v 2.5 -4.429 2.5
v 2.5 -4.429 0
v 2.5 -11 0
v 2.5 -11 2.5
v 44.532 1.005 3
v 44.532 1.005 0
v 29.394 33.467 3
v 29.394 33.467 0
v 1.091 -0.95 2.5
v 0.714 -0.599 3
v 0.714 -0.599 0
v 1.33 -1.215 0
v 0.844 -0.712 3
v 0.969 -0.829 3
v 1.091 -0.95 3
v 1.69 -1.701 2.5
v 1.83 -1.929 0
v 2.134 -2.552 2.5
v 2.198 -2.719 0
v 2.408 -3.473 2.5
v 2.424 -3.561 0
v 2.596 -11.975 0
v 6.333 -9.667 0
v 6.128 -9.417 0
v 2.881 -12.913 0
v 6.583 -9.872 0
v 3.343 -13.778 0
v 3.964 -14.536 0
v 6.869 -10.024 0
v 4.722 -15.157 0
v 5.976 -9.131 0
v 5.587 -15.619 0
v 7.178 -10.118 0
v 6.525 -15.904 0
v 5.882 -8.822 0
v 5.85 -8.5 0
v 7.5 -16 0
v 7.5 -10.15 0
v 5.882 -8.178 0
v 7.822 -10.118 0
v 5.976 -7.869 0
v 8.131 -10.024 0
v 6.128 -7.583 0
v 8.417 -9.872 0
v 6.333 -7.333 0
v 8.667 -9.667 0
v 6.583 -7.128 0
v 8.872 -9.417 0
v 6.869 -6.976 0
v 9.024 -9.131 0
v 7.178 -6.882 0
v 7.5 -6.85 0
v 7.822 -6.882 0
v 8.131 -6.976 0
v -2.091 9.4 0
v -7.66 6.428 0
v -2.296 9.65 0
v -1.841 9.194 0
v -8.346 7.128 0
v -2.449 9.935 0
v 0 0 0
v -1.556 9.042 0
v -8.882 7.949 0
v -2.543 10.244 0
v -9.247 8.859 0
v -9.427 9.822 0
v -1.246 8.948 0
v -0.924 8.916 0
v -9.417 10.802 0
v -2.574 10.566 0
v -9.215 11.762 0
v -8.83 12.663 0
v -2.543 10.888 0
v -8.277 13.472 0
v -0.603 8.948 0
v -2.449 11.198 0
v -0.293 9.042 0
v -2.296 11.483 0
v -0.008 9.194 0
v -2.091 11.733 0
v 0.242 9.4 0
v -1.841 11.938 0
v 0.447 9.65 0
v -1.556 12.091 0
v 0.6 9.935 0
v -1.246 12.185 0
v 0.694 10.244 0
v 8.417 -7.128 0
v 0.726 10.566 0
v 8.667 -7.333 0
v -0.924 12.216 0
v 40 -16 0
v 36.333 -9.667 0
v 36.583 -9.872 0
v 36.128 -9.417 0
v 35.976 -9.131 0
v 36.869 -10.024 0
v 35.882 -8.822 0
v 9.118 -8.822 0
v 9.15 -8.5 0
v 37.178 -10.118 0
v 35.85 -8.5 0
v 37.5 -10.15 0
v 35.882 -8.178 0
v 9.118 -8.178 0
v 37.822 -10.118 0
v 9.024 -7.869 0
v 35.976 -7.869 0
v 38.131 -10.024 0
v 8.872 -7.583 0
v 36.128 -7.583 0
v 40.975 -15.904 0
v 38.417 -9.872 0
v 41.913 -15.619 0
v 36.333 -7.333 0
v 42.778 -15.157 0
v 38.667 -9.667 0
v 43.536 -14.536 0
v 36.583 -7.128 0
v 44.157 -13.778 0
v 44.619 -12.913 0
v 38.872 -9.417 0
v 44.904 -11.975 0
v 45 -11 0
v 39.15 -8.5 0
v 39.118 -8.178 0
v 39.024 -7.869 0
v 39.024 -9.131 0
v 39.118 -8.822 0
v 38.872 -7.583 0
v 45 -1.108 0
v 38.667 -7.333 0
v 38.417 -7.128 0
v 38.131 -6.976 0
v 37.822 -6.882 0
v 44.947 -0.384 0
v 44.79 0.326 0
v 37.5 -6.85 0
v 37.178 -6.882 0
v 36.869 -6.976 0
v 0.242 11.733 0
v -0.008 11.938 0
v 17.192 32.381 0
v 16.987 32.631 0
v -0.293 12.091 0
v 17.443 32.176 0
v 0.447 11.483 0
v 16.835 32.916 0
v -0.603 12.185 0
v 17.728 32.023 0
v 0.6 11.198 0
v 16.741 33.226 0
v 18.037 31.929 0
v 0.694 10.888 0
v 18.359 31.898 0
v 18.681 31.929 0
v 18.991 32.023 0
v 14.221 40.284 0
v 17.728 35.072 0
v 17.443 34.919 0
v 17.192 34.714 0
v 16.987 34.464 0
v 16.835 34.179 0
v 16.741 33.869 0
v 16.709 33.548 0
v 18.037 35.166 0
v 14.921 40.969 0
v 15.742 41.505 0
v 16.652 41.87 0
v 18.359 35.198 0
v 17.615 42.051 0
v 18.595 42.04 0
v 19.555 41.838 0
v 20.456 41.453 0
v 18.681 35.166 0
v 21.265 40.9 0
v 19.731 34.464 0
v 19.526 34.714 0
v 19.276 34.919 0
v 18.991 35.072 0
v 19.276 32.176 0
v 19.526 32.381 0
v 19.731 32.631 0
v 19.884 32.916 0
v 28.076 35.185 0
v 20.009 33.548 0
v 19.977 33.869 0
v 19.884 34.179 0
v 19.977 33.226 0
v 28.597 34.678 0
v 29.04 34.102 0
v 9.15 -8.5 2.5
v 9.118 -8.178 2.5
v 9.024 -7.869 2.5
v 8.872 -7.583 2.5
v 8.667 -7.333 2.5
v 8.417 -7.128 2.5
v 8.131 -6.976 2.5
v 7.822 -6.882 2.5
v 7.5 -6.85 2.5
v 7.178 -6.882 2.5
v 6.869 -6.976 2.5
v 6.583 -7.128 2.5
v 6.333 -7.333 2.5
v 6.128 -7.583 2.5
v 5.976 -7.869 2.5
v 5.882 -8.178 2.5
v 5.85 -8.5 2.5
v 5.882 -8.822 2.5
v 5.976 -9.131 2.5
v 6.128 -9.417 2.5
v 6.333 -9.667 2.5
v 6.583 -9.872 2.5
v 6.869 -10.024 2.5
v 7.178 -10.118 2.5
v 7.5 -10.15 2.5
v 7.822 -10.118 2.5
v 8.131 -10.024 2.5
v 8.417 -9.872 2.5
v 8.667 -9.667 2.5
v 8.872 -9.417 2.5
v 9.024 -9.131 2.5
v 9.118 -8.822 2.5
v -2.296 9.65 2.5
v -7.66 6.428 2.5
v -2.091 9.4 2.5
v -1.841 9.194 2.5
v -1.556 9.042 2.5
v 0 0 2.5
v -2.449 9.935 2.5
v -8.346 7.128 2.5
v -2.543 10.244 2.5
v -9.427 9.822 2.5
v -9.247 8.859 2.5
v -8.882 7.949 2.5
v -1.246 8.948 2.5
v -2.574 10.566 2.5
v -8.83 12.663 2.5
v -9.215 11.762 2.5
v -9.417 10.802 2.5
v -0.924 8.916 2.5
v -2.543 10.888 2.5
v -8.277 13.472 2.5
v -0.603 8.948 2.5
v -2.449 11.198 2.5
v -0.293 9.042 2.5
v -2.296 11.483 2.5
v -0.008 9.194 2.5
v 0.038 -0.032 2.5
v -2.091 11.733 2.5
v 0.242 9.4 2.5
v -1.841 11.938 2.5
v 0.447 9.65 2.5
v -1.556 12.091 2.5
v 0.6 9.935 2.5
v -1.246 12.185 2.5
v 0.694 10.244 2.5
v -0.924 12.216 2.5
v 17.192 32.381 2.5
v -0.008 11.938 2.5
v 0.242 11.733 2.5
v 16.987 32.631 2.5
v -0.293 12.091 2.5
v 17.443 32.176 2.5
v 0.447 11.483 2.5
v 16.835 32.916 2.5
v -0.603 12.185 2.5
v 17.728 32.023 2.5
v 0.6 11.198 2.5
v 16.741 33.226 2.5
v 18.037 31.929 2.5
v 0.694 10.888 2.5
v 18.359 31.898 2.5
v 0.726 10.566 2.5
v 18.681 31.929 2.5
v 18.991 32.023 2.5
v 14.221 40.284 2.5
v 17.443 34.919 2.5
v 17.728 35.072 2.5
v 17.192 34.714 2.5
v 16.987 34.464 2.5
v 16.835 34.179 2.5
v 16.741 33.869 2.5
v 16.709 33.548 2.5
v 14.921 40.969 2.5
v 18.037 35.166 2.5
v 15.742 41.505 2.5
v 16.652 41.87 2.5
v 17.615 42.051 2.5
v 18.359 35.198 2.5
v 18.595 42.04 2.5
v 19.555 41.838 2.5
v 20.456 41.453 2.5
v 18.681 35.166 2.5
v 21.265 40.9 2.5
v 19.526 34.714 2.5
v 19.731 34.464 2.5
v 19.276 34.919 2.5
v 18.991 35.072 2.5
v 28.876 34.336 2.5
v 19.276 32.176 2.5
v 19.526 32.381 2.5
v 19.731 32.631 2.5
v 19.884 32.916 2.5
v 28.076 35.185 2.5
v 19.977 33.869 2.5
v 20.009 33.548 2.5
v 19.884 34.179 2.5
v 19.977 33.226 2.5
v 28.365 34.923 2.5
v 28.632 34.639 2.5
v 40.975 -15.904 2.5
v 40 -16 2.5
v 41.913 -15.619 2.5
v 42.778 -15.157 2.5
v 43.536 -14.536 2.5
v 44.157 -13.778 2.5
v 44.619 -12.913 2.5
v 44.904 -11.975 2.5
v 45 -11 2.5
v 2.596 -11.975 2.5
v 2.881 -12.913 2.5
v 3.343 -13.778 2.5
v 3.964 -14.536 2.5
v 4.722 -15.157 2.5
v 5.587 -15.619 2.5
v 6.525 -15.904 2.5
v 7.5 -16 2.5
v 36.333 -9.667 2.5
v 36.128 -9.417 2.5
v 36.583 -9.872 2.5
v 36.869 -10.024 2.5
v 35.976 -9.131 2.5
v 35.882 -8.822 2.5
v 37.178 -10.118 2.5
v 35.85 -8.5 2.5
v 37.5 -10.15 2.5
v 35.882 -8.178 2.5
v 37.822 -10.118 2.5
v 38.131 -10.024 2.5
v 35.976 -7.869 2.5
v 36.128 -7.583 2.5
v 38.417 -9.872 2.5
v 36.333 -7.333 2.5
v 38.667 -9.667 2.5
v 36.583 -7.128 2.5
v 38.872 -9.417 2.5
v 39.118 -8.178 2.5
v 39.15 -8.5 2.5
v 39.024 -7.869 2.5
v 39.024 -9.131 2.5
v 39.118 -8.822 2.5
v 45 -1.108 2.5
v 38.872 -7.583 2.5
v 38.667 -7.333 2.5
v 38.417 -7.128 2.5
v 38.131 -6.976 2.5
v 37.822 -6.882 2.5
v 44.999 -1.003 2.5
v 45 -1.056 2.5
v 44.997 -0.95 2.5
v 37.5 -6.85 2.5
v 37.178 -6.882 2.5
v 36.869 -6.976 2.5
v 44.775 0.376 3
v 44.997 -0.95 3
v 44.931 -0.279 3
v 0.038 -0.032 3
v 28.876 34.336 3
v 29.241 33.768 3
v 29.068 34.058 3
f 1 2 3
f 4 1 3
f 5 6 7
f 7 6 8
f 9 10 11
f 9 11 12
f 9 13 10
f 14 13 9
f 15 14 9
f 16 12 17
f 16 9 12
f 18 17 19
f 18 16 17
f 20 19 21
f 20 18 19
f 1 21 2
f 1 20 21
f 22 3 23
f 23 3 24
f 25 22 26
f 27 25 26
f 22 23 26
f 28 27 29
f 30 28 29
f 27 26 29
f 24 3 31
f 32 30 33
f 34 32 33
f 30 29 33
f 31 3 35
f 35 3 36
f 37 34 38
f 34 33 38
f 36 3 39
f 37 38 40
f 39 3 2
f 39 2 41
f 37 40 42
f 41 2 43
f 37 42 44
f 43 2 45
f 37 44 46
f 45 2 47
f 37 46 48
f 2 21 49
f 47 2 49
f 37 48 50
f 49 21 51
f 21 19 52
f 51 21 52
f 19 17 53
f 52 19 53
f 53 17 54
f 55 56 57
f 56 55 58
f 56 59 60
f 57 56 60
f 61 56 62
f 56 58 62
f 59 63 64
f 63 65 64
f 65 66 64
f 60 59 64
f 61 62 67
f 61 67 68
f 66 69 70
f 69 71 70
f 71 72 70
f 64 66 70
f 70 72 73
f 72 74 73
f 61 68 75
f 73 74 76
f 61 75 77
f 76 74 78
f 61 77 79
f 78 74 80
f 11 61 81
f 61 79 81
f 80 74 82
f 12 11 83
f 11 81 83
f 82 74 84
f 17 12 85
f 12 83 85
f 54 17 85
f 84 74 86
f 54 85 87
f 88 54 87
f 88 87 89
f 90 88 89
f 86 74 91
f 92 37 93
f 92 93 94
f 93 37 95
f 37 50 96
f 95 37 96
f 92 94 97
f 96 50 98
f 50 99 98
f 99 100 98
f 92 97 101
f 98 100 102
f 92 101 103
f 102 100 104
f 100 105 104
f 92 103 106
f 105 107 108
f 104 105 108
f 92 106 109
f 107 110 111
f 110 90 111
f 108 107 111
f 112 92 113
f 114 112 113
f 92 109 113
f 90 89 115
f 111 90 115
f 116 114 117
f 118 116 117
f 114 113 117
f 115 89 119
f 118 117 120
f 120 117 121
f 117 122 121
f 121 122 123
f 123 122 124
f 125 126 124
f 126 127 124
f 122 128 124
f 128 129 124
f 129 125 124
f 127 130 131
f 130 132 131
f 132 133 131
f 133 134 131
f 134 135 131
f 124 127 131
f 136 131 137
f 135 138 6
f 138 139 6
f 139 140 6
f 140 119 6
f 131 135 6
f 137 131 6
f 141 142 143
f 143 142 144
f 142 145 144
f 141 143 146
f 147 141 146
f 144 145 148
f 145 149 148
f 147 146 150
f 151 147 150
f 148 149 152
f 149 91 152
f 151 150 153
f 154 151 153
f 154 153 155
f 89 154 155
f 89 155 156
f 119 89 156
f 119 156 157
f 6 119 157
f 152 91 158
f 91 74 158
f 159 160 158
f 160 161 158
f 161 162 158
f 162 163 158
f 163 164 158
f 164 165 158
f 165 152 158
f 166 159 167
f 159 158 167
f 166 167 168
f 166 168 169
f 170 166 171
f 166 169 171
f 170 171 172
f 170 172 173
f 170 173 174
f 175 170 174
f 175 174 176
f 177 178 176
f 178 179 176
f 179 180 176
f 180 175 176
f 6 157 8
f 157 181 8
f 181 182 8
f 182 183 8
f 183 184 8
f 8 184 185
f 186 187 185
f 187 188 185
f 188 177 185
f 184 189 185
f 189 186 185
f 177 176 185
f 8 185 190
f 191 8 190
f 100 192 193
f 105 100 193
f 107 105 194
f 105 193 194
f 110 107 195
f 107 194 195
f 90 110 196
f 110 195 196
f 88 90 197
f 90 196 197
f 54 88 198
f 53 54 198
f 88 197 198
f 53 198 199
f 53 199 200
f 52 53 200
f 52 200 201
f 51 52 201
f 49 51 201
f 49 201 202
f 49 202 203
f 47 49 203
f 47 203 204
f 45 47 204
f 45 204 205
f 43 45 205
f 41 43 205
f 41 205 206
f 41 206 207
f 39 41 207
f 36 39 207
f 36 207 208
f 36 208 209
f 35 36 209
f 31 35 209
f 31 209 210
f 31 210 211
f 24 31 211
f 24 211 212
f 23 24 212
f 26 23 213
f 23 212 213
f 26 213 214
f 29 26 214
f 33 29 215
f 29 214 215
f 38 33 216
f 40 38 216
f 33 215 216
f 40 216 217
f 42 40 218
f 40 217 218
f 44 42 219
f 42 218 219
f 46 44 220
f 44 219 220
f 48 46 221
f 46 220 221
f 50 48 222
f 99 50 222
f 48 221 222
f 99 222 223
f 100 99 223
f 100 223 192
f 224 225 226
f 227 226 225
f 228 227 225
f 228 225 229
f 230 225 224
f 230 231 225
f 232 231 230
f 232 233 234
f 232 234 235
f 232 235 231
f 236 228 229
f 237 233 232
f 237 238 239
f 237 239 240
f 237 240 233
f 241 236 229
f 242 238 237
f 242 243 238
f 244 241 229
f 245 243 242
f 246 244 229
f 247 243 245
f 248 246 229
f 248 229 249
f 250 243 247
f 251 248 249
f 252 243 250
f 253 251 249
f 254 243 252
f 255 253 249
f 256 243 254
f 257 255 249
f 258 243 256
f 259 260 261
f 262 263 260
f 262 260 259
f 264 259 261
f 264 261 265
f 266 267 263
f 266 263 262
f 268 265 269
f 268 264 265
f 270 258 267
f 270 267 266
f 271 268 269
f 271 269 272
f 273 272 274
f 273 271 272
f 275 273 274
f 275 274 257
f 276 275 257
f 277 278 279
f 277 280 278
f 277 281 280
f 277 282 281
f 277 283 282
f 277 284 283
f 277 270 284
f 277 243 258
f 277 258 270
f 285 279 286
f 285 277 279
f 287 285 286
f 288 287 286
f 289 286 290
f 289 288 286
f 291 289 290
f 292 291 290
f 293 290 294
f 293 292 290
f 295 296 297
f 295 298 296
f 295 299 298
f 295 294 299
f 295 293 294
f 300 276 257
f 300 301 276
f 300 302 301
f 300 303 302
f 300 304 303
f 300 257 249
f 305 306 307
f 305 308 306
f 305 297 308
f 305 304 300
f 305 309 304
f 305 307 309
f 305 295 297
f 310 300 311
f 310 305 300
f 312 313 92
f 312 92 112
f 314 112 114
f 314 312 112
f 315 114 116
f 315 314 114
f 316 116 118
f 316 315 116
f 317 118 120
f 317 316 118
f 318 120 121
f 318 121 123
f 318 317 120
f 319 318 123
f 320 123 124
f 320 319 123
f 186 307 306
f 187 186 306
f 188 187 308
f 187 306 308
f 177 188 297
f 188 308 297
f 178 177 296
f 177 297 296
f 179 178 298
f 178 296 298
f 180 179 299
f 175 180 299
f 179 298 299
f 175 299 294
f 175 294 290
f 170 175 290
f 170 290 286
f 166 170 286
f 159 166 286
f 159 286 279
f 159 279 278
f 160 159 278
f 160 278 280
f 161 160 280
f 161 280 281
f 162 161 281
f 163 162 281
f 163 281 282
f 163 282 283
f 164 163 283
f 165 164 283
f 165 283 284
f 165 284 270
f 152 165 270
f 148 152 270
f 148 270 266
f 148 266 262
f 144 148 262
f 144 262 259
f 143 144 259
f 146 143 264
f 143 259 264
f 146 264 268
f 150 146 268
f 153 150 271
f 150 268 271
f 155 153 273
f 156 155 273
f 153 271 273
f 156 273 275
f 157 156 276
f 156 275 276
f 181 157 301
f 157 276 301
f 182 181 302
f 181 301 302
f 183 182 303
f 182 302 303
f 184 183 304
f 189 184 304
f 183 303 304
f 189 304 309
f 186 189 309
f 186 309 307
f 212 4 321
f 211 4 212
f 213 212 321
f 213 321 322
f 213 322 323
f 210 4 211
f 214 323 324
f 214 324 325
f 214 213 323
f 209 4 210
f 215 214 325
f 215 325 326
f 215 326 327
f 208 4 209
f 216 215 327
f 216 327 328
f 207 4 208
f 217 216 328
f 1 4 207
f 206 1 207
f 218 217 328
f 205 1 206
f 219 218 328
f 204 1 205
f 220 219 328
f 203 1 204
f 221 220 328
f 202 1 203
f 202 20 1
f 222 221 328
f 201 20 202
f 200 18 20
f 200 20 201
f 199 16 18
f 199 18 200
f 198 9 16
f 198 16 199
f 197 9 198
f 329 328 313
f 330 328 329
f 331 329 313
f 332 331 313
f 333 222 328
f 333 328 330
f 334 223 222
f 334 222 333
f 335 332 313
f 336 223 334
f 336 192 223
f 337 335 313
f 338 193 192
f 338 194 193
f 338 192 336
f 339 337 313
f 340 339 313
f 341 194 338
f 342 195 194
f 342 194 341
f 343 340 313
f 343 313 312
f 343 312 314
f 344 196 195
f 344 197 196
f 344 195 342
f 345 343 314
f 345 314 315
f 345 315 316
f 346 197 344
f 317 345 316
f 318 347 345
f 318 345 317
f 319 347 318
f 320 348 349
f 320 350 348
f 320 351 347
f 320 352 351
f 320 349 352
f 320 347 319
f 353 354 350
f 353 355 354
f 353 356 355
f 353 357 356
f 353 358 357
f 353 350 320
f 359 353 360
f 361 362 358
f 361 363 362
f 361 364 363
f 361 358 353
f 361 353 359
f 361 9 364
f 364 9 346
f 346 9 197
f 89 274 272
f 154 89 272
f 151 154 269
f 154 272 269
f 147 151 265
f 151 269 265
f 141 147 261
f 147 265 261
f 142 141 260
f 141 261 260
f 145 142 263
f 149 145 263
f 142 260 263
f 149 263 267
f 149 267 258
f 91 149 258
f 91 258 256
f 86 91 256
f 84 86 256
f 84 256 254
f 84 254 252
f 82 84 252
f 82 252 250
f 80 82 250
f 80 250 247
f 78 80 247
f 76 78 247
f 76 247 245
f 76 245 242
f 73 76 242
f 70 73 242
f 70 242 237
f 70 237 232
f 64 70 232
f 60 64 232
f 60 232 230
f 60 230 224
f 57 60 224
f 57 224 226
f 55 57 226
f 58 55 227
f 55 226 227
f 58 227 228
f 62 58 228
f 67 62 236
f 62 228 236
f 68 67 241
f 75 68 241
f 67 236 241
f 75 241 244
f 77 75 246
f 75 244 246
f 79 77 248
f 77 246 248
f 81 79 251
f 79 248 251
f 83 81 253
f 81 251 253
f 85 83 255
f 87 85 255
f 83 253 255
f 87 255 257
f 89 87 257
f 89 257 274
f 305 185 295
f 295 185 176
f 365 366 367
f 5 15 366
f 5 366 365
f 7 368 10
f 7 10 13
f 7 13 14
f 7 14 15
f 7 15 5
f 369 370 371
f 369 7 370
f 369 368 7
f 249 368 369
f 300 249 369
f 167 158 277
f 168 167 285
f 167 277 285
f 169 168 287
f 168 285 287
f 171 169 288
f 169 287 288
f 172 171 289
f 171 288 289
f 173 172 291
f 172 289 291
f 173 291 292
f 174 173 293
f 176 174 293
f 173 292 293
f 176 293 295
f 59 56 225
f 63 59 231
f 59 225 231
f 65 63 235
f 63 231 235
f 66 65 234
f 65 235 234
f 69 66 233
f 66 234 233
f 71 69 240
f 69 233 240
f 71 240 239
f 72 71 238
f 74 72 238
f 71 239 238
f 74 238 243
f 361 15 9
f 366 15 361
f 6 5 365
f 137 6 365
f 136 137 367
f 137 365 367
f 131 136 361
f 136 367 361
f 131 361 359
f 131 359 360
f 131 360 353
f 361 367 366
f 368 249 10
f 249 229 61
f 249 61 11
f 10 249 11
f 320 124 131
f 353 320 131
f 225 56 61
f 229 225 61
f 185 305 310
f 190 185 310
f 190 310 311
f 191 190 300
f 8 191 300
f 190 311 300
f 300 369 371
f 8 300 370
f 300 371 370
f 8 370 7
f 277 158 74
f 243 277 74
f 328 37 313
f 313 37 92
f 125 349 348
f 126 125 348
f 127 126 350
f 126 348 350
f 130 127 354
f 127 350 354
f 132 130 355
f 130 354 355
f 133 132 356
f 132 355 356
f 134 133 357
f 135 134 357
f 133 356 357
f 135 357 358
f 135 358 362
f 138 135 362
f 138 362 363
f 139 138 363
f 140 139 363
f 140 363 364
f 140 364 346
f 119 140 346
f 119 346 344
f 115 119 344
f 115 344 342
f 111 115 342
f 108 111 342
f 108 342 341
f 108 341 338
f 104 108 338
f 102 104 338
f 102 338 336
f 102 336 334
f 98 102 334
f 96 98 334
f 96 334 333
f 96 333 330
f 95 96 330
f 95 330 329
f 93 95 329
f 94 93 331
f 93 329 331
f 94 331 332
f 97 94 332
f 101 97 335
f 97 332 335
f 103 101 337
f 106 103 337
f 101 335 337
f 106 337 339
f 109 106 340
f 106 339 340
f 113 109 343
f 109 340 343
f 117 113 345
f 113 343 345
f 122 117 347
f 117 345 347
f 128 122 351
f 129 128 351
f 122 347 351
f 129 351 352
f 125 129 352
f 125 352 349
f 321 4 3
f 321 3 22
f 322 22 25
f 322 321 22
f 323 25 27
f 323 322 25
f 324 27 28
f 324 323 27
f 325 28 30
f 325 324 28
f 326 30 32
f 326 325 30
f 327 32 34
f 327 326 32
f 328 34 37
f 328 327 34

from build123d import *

# Parameters (mm, degrees)
EXTRUDE_1_DEPTH     = 3
SKETCH_2_R          = 1.65
CUT_EXTRUDE_1_DEPTH = 3
FILLET_2_R          = 5
SKETCH_3_W          = 44.5
SKETCH_3_H          = 15.05
CUT_EXTRUDE_2_DEPTH = 0.5


with BuildPart() as part:
    # ｽｹｯﾁ1 → ﾎﾞｽ - 押し出し1 (new body)
    with BuildSketch(Plane.XY):
        Polygon((-11.490666647, 9.641814145), (0, 0), (2.5, -2.097749078), (2.5, -16), (45, -16), (45, 0), (28.925442436, 34.47199994), (17.434775789, 44.113814086), align=None)
    extrude(amount=EXTRUDE_1_DEPTH)

    # ｽｹｯﾁ2 → ｶｯﾄ - 押し出し1 (cut)
    with BuildSketch(Plane.XY.offset(3)):
        with Locations((7.5, -8.5)):
            Circle(SKETCH_2_R)
        with Locations((-0.924426251, 10.566240396)):
            Circle(SKETCH_2_R)
        with Locations((18.35920204, 33.54757369)):
            Circle(SKETCH_2_R)
        with Locations((37.5, -8.5)):
            Circle(SKETCH_2_R)
    extrude(amount=-CUT_EXTRUDE_1_DEPTH, mode=Mode.SUBTRACT)

    # ﾌｨﾚｯﾄ2
    fillet_2_edges = [part.edges().sort_by_distance(p)[0] for p in [
        (-11.490666647, 9.641814145, 1.5),
        (17.434775789, 44.113814086, 1.5),
        (28.925442436, 34.47199994, 1.5),
        (45, 0, 1.5),
        (45, -16, 1.5),
        (2.5, -16, 1.5),
        (2.5, -2.097749078, 1.5),
    ]]
    fillet(fillet_2_edges, radius=FILLET_2_R)

    # ｽｹｯﾁ3 → ｶｯﾄ - 押し出し2 (cut)
    with BuildSketch(Plane.XY.offset(3)):
        Polygon((17.434775789, 44.113814086), (-12.133454256, 8.875769702), (-0.604485388, -0.798183824), (28.963744658, 34.43986056), align=None)
        with Locations((22.75, -8.475)):
            Rectangle(SKETCH_3_W, SKETCH_3_H)
    extrude(amount=-CUT_EXTRUDE_2_DEPTH, mode=Mode.SUBTRACT)


solid = part.part
